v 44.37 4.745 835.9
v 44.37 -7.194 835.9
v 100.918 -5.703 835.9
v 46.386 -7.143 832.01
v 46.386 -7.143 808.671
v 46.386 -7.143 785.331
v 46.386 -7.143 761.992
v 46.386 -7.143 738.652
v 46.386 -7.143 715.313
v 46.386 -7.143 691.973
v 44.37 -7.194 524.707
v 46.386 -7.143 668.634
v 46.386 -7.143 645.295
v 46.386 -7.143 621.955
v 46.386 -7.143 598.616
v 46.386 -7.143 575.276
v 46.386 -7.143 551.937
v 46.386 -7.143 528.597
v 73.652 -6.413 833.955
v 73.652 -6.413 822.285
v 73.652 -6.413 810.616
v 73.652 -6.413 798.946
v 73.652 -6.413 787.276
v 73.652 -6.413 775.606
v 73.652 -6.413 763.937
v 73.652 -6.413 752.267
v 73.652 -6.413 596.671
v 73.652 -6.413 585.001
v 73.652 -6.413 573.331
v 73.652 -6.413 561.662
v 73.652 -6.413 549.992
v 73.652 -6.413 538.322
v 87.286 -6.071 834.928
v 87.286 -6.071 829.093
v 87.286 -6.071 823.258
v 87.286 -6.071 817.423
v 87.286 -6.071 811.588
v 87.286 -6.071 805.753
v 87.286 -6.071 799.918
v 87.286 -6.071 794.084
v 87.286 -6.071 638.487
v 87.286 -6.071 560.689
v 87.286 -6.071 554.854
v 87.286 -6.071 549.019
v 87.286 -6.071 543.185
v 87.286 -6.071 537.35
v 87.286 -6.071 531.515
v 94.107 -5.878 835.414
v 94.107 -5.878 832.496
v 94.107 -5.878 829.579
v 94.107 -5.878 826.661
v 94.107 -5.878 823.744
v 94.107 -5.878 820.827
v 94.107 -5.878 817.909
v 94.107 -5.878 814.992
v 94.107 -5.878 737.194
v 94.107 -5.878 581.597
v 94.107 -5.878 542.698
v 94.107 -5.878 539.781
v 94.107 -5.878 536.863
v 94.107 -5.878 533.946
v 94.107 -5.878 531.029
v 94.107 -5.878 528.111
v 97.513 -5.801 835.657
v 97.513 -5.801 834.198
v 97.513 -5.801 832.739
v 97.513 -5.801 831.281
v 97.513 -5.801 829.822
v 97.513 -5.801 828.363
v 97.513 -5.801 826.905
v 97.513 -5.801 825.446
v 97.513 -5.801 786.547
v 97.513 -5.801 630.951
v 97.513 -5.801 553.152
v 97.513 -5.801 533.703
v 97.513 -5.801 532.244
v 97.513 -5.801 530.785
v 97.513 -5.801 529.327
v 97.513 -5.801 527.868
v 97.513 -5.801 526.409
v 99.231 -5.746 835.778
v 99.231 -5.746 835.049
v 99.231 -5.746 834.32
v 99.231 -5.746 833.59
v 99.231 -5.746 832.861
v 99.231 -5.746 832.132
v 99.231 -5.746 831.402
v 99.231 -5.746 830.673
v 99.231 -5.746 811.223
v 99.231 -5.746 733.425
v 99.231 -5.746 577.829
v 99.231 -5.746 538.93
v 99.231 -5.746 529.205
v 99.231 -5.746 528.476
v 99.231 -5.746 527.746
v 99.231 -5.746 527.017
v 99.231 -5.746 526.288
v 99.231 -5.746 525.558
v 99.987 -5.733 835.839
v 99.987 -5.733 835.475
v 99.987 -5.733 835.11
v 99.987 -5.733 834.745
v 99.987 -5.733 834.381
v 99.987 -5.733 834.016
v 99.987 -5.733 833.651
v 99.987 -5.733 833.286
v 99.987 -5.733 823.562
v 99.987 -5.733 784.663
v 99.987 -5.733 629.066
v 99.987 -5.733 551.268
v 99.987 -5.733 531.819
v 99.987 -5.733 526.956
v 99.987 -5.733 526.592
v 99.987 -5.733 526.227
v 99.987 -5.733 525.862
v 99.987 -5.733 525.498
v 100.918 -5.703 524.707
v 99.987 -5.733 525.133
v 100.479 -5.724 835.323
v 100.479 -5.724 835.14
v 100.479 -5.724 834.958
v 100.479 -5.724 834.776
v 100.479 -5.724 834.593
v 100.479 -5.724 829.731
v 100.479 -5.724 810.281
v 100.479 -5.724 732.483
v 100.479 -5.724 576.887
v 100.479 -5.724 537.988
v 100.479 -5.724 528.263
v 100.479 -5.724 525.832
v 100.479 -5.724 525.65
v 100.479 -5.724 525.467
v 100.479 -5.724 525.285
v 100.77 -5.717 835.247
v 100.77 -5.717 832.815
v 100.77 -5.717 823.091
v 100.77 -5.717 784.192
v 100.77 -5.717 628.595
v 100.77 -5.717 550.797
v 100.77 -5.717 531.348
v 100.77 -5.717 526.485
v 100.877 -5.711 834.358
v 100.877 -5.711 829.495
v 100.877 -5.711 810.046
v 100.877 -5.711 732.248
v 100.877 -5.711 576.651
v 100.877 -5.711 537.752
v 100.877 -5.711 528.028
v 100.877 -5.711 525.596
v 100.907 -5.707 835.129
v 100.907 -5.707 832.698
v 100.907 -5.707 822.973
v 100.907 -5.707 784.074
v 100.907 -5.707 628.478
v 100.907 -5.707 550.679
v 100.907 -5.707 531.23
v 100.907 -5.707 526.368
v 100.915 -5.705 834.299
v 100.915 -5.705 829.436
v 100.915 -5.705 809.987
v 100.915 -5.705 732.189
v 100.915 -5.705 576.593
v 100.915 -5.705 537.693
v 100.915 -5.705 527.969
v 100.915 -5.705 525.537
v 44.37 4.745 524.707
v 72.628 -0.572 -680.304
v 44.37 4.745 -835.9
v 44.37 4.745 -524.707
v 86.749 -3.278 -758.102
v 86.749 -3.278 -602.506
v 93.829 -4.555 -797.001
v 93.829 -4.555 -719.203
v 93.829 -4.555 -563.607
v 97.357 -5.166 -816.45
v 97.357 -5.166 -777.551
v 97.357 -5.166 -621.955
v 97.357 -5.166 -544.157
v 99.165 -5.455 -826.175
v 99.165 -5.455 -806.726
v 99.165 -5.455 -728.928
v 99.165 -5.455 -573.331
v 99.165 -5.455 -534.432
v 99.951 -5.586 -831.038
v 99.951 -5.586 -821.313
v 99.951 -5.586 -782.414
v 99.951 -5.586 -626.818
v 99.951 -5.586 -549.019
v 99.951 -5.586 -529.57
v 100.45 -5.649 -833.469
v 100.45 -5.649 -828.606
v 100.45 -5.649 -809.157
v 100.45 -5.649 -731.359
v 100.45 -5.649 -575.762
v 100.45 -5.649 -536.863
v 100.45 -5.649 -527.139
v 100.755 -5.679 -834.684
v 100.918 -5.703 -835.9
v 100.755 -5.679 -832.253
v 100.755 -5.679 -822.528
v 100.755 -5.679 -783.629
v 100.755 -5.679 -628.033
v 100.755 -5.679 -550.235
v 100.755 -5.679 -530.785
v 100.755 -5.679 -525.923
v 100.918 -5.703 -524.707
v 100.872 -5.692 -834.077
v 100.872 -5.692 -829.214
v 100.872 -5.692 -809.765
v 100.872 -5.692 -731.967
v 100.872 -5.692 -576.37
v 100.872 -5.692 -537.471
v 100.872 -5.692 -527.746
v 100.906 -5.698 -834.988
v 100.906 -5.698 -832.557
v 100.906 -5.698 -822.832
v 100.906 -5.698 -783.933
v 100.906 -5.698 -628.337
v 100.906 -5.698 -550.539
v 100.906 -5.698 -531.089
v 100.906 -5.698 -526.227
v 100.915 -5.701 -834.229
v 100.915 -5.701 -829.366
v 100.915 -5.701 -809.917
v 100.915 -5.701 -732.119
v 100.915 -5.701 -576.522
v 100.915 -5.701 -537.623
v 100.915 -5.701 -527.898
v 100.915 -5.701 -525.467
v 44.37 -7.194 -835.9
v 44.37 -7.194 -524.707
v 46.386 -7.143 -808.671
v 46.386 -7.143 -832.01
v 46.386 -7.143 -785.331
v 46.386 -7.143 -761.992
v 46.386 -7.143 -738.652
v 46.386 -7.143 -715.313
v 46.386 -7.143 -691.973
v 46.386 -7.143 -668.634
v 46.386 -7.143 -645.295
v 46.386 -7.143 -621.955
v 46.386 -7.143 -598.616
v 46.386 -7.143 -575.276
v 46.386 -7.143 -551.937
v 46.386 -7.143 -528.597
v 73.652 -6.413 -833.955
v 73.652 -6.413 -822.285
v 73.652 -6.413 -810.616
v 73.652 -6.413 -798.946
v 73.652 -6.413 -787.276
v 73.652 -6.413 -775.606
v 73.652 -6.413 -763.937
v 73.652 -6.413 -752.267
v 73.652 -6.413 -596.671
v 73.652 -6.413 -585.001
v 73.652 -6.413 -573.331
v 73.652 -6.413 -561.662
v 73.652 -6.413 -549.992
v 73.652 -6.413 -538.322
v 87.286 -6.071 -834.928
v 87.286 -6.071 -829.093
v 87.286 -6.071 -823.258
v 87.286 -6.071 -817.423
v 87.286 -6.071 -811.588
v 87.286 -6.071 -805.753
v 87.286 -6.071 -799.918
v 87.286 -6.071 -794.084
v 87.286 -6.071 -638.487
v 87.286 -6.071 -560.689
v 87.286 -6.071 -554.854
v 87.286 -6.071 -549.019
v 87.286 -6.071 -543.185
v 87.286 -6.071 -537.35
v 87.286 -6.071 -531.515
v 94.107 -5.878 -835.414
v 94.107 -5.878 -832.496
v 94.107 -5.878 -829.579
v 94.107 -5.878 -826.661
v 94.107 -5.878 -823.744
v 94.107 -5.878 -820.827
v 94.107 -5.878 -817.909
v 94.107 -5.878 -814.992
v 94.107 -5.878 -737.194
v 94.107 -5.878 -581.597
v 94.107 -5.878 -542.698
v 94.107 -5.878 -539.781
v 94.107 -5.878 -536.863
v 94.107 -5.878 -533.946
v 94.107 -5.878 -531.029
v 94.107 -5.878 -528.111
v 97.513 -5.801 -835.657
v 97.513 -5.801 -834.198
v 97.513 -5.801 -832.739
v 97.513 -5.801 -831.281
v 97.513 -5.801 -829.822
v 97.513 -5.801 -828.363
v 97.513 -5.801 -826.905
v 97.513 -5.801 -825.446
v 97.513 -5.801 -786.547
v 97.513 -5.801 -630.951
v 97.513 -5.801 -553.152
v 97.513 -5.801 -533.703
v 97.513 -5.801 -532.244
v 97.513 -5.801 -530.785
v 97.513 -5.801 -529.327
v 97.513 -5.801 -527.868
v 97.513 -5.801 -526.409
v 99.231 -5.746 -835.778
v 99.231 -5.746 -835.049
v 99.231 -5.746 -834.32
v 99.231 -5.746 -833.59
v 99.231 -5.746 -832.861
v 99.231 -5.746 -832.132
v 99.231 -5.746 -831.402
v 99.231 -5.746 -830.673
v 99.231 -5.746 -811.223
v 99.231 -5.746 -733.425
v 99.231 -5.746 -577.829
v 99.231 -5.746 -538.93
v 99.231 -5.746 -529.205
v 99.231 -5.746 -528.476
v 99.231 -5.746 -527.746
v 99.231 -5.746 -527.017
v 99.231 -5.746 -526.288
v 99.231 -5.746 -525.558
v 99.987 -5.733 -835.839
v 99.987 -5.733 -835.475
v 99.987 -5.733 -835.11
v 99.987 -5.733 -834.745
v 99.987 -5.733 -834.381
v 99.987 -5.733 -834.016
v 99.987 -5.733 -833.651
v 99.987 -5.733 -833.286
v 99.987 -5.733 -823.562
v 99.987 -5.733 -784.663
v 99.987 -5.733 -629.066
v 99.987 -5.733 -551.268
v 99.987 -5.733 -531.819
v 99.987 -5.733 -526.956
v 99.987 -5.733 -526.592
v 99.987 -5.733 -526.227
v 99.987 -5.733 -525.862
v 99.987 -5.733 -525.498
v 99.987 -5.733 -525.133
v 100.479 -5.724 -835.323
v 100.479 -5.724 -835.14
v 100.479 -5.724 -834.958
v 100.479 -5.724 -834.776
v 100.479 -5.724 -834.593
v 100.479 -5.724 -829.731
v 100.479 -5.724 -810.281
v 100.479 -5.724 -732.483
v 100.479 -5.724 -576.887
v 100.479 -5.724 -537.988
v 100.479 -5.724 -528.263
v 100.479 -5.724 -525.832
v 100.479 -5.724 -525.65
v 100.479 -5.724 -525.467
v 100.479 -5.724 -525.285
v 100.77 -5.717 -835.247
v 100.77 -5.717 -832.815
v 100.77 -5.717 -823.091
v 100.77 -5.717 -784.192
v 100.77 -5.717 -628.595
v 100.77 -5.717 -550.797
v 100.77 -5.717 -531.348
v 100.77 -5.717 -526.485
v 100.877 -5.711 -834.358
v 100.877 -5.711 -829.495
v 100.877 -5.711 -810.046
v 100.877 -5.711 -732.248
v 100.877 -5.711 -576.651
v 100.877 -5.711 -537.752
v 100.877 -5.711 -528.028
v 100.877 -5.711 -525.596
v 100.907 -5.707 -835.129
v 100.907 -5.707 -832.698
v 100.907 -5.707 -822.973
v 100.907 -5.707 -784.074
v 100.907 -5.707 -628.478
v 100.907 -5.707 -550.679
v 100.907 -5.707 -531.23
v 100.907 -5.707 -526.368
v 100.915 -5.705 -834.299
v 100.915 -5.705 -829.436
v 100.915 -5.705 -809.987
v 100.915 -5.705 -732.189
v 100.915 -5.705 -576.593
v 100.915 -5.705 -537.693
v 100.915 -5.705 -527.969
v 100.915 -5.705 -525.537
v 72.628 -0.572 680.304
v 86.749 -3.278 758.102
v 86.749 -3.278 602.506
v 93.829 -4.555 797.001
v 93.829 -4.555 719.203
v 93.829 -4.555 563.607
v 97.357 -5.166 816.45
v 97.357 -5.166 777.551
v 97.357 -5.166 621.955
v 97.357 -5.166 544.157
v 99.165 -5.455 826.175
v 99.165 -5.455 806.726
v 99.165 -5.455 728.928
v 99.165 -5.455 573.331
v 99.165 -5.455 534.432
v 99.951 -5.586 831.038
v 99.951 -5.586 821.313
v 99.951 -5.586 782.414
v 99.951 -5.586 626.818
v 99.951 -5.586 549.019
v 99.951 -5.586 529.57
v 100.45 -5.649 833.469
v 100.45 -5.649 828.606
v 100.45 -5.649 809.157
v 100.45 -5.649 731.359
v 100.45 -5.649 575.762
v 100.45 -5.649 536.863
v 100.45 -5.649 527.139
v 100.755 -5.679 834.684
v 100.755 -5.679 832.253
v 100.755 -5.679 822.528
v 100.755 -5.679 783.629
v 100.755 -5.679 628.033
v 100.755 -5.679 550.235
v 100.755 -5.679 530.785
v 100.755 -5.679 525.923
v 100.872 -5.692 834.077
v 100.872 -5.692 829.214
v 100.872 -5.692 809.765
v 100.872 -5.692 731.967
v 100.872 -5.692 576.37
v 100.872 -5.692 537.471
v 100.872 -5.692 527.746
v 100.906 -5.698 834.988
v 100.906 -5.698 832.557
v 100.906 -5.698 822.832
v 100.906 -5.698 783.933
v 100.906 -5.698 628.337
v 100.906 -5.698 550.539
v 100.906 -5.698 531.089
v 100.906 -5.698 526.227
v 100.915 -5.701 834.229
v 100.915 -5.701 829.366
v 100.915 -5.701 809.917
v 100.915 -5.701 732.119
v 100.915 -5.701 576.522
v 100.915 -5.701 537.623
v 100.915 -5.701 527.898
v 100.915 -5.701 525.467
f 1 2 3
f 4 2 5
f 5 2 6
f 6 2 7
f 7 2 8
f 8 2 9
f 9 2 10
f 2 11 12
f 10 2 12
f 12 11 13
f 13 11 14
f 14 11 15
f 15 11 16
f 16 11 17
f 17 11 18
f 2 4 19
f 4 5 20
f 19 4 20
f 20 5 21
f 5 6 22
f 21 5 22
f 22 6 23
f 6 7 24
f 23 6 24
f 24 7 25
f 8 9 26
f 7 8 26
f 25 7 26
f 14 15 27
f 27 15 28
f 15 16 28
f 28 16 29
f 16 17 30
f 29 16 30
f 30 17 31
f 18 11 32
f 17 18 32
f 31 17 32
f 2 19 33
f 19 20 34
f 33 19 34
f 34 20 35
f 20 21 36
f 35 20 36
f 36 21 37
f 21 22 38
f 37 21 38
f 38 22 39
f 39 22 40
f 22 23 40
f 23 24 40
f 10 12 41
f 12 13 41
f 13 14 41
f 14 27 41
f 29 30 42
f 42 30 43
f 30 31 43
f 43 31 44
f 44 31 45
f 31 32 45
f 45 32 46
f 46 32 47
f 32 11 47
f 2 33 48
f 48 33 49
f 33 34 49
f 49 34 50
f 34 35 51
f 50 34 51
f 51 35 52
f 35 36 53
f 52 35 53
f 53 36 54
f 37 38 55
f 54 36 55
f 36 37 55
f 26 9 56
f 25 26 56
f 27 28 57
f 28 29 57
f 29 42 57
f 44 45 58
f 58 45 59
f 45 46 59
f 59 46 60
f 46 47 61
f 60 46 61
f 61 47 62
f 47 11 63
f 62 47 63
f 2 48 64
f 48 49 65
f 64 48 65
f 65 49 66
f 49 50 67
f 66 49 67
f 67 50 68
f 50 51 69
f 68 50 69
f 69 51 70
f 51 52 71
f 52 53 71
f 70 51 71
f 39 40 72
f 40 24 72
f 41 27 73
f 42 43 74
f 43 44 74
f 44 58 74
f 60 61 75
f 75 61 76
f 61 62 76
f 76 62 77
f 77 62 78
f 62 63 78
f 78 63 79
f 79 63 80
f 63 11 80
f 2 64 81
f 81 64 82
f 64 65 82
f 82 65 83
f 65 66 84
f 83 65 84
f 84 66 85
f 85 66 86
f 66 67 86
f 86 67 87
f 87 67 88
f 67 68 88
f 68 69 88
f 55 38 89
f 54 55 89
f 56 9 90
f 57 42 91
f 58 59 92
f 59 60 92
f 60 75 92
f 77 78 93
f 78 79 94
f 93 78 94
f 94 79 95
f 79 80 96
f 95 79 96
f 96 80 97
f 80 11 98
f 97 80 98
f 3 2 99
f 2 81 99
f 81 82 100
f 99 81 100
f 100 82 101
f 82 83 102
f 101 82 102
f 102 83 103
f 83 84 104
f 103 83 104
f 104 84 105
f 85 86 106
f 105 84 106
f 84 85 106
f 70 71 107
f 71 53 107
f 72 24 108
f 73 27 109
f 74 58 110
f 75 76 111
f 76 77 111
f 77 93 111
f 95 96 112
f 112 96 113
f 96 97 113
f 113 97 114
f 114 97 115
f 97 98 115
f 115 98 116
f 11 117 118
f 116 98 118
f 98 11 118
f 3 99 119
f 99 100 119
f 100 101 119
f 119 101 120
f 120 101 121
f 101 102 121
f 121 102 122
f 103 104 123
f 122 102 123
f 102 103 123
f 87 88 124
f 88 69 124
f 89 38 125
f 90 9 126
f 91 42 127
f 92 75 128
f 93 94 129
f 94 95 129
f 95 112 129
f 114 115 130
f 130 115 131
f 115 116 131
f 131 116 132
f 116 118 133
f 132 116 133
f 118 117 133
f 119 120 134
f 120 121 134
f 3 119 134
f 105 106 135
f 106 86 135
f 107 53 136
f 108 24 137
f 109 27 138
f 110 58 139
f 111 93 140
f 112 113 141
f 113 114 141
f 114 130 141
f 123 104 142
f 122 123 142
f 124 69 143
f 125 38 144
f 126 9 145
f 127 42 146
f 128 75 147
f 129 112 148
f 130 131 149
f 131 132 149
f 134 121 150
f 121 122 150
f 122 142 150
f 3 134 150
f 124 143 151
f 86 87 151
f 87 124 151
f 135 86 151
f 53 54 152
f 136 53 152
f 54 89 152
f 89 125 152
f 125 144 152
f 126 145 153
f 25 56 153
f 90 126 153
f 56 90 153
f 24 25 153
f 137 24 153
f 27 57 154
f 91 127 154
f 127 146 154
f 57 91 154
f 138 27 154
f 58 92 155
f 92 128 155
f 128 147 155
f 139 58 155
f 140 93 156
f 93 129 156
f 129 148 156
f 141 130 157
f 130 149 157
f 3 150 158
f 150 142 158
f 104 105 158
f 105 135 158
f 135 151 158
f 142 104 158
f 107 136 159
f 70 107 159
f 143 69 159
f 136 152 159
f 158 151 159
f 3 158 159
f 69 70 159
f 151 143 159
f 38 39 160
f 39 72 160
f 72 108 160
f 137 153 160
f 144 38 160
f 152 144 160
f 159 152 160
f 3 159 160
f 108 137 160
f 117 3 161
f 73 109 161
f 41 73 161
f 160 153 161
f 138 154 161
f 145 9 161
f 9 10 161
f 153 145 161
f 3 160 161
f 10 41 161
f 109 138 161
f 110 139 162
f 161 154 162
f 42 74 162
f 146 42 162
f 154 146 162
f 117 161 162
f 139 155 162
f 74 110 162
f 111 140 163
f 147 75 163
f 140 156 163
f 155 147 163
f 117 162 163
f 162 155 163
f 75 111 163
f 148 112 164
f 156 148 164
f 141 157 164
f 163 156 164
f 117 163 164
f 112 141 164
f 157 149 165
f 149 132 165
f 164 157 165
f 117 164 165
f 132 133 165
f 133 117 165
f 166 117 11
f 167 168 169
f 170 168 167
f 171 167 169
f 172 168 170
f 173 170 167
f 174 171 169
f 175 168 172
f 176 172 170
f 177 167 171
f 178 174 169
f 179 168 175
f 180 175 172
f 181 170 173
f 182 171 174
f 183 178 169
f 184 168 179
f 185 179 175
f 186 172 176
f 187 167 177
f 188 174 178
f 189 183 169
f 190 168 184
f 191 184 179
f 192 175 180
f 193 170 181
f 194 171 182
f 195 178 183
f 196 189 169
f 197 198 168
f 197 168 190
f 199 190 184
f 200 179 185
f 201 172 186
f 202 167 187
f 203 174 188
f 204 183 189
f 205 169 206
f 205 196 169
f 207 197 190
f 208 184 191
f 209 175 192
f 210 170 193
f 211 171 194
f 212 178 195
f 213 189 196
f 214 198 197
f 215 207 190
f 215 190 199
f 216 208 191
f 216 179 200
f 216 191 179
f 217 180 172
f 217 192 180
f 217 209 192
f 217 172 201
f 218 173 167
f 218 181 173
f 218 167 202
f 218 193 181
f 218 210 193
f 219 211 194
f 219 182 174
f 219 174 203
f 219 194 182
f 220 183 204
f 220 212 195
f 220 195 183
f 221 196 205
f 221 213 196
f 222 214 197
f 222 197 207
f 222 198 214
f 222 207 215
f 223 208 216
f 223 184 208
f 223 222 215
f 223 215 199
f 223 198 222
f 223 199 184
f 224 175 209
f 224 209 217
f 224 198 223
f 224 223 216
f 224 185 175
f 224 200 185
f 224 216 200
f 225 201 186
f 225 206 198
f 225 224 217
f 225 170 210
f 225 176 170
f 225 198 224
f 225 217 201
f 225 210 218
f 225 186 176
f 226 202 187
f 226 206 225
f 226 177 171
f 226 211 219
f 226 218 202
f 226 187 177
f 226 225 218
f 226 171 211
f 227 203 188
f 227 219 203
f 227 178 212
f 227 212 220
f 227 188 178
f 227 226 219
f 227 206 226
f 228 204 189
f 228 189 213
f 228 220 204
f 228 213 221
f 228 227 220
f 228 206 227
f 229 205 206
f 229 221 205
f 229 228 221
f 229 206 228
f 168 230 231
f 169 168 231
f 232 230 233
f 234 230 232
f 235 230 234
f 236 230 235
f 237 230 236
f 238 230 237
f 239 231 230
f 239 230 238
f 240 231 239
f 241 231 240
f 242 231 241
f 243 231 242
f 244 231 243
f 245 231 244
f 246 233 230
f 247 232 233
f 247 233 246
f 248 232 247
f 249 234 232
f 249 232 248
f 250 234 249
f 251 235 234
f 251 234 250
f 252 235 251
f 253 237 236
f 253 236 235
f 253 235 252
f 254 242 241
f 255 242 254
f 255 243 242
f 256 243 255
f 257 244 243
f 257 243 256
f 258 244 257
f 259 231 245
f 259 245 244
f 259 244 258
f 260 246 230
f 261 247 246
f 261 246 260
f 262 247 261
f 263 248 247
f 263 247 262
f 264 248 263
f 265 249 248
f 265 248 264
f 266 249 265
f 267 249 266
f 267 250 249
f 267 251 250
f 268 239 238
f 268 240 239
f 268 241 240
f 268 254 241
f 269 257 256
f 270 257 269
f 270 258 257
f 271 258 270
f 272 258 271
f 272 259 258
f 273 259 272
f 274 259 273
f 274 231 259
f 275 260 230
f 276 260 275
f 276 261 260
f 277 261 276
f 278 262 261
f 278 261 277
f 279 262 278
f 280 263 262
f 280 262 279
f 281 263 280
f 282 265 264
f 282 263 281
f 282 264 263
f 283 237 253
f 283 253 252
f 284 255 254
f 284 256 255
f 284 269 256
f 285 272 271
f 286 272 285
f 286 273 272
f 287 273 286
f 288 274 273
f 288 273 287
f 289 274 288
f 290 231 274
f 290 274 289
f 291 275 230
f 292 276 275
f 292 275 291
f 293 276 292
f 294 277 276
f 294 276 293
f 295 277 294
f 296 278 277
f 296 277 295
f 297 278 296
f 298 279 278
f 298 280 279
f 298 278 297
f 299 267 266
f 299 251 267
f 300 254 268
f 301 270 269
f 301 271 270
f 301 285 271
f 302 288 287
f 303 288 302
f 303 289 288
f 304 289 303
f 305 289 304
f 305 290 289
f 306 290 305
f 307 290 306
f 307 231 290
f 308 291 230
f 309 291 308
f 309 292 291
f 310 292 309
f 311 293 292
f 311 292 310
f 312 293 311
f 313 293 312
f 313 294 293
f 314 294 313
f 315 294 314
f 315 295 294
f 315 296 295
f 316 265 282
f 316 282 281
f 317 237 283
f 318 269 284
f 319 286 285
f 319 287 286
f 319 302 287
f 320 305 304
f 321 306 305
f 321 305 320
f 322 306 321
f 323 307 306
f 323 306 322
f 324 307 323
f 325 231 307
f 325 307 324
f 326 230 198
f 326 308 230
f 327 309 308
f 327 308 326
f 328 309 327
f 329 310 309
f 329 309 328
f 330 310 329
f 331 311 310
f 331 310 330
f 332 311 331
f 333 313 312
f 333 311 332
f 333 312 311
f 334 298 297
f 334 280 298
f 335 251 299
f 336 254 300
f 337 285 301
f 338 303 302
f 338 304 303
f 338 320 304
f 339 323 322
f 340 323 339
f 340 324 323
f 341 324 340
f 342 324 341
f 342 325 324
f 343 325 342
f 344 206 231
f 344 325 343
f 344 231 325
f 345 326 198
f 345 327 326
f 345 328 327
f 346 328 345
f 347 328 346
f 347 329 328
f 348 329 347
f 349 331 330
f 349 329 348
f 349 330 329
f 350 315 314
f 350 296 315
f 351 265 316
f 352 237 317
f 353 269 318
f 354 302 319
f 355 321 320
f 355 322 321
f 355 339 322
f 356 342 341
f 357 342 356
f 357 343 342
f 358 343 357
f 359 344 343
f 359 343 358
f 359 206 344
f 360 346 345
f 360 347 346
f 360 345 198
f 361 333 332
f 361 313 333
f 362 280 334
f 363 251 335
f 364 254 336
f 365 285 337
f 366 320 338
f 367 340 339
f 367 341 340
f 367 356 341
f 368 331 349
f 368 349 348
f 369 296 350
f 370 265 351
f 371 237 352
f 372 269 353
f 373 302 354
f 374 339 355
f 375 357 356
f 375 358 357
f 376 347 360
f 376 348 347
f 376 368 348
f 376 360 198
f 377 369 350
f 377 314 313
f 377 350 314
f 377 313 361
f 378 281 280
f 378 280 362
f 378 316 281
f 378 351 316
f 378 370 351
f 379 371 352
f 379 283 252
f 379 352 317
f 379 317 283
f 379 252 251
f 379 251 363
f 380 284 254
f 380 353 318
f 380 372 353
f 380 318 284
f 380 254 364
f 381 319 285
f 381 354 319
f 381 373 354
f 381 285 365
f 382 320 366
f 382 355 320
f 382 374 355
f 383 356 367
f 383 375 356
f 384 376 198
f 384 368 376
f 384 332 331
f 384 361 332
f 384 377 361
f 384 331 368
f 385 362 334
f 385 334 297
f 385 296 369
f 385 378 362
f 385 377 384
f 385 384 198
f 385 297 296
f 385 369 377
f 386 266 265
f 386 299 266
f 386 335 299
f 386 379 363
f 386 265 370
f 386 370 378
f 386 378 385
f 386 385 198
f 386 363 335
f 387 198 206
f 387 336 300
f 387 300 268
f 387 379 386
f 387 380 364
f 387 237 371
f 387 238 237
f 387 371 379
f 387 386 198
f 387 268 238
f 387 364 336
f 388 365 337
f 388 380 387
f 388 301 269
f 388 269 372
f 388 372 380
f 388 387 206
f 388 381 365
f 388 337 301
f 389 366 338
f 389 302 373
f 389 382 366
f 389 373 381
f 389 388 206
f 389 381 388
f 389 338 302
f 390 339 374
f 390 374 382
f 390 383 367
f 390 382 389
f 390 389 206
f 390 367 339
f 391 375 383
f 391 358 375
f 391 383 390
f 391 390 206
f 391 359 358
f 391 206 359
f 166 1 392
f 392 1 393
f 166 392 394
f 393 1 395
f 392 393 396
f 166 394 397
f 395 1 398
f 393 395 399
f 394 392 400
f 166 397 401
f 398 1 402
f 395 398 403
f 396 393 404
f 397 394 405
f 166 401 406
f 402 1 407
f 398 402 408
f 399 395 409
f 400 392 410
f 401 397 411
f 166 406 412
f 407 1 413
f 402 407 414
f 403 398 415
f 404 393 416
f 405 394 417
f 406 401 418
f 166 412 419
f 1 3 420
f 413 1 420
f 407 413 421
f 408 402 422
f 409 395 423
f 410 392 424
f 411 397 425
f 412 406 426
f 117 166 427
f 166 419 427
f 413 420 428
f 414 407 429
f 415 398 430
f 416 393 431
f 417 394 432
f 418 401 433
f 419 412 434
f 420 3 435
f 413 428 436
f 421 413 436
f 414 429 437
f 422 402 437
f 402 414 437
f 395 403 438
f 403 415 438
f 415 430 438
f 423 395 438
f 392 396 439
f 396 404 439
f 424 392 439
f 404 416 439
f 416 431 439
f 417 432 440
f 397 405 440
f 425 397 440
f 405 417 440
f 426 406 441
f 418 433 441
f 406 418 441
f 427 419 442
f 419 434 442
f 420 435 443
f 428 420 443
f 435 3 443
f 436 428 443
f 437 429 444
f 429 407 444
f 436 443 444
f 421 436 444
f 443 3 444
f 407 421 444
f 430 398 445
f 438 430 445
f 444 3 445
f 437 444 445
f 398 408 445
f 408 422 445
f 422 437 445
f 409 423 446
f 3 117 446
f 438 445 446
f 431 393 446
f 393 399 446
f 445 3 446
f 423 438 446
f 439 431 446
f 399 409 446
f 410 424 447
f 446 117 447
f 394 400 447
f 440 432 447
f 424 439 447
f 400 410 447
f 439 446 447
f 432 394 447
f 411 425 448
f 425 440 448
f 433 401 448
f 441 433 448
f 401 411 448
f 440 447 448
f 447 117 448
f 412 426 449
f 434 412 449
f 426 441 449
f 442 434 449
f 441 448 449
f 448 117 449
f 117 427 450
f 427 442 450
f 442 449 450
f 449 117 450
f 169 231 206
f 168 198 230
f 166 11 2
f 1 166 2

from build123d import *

# Parameters (mm, degrees)
BOSS_EXTRUDE1_DEPTH     = 875
CUT_EXTRUDE1_DEPTH      = 881.879454843
CUT_EXTRUDE1_DEPTH_BACK = 881.879454843


with BuildPart() as part:
    # Sketch1 → Boss-Extrude1 (new, symmetric)
    with BuildSketch(Plane.XY):
        with BuildLine():
            add(Edge.make_bspline(
                [(100.91824287, -5.70312156), (100.917928302, -5.691984058), (100.103872555, -5.623522289), (99.280592479, -5.464574379), (97.301838761, -5.167293181), (94.893792204, -4.740313208), (91.763418033, -4.194020721), (88.075779131, -3.527092424), (83.82586832, -2.733839889), (79.07466539, -1.829159833), (73.868292655, -0.815261424), (68.257586758, 0.28149671), (62.297699244, 1.44772436), (56.040627516, 2.659541325), (49.522304418, 3.863298421), (42.776163339, 5.024182063), (35.842465214, 6.159362695), (28.754894986, 7.225237491), (21.557088168, 8.212036363), (14.289938921, 9.11702244), (6.986491581, 9.896502104), (-0.312291465, 10.567439736), (-7.573250933, 11.101452566), (-14.756788427, 11.484472196), (-21.829214216, 11.73432499), (-28.756354515, 11.821009192), (-35.503522333, 11.750617393), (-42.039927215, 11.528099679), (-48.337618053, 11.139668586), (-54.368823591, 10.599316119), (-60.107813763, 9.916065983), (-65.5246312, 9.082841334), (-70.600710971, 8.133580398), (-75.312124387, 7.06030936), (-79.639012678, 5.882400605), (-83.565794194, 4.620592947), (-87.074573399, 3.286478994), (-90.155255222, 1.908430123), (-92.7947781, 0.504611279), (-94.983077923, -0.904381491), (-96.712918902, -2.27019758), (-98.000485425, -3.580792759), (-98.761905736, -4.743195836), (-99.230109063, -5.858193724), (-98.606025292, -6.870082158), (-97.444377041, -7.545330585), (-95.746709082, -8.188615648), (-93.444858666, -8.65302005), (-90.532849186, -8.981809806), (-87.012786058, -9.249938029), (-82.906631066, -9.471230862), (-78.240220774, -9.591108348), (-73.047587861, -9.700035936), (-67.364458994, -9.726825212), (-61.232945666, -9.735598818), (-54.695580066, -9.663971329), (-47.787860167, -9.57405054), (-40.547660449, -9.399905225), (-33.014906842, -9.224168897), (-25.241541211, -9.024405524), (-17.28179212, -8.801970667), (-9.194124895, -8.575484575), (-1.034753503, -8.389600976), (7.134931724, -8.163914261), (15.261915306, -7.937211966), (23.292019947, -7.753265877), (31.171989128, -7.520412865), (38.853338861, -7.320323338), (46.282726984, -7.155039977), (53.396722649, -6.942825345), (60.134764376, -6.764425726), (66.461797873, -6.610760114), (72.370019545, -6.444067915), (77.851690837, -6.304693879), (82.870292529, -6.189451934), (87.37297449, -6.074184551), (91.286636897, -5.943657403), (94.610580102, -5.86381881), (97.158504539, -5.820700532), (99.231452991, -5.738256396), (100.085997803, -5.733999914), (100.918560502, -5.714367546), (100.91824287, -5.70312156)],
                knots=[0, 0, 0, 0, 0.000950607, 0.003756507, 0.008317118, 0.014521534, 0.022293258, 0.031559824, 0.042220752, 0.054150955, 0.067231026, 0.081331038, 0.096307423, 0.112011952, 0.128327294, 0.145184499, 0.162487629, 0.180135525, 0.198033488, 0.216058829, 0.234134495, 0.252191782, 0.270104077, 0.287817033, 0.305234681, 0.322284448, 0.338896329, 0.354986109, 0.370505848, 0.385416956, 0.399632136, 0.413115968, 0.42582253, 0.437703697, 0.448737409, 0.458879724, 0.468105333, 0.476404612, 0.483748471, 0.49013386, 0.495557186, 0.500011534, 0.503516098, 0.506001286, 0.508215361, 0.511493607, 0.515843652, 0.521547383, 0.528754592, 0.537448665, 0.547575188, 0.55907379, 0.571867409, 0.585873248, 0.600979911, 0.617080267, 0.634081341, 0.651920682, 0.670483603, 0.689642387, 0.709259499, 0.729200941, 0.749303287, 0.769441295, 0.789466278, 0.8092541, 0.828669736, 0.847597548, 0.865914743, 0.883466594, 0.900078509, 0.915617835, 0.930134998, 0.943663107, 0.956049855, 0.967158865, 0.976852657, 0.984995817, 0.991471781, 0.996183553, 0.999040133, 1, 1, 1, 1], degree=3))
        make_face()
    extrude(amount=BOSS_EXTRUDE1_DEPTH, both=True)

    # Sketch3 → Cut-Extrude1 (cut, two sides: drawn at the far end of the back side and taken through both)
    with BuildSketch(Plane(origin=(0, 0, 0), x_dir=(1, 0, 0), z_dir=(0, 1, 0)).offset(-CUT_EXTRUDE1_DEPTH_BACK)):
        Polygon((100.918243231, 835.9), (44.370126982, 835.9), (44.370126982, 524.707472239), (100.918243231, 524.707472239), (100.918243231, -524.707472239), (44.370126982, -524.707472239), (44.370126982, -835.9), (100.918243231, -835.9), (100.918243231, -1428.407127824), (-134.13320566, -1428.407127824), (-134.13320566, 941.271454546), (100.918243231, 941.271454546), align=None)
    extrude(amount=CUT_EXTRUDE1_DEPTH + CUT_EXTRUDE1_DEPTH_BACK, mode=Mode.SUBTRACT)


with BuildPart() as cut_extrude1_piece_1:
    # of the separate pieces the step leaves, piece 1, a body of its own (cut_extrude1_pieces)
    add(part.part.solids().sort_by_distance((100.91824311, -5.703138592, 524.707472239))[0])


with BuildPart() as cut_extrude1_piece_2:
    # of the separate pieces the step leaves, piece 2, a body of its own (cut_extrude1_pieces)
    add(part.part.solids().sort_by_distance((44.370126982, 4.745424617, -524.707472239))[0])


solid = Compound([cut_extrude1_piece_1.part, cut_extrude1_piece_2.part])
